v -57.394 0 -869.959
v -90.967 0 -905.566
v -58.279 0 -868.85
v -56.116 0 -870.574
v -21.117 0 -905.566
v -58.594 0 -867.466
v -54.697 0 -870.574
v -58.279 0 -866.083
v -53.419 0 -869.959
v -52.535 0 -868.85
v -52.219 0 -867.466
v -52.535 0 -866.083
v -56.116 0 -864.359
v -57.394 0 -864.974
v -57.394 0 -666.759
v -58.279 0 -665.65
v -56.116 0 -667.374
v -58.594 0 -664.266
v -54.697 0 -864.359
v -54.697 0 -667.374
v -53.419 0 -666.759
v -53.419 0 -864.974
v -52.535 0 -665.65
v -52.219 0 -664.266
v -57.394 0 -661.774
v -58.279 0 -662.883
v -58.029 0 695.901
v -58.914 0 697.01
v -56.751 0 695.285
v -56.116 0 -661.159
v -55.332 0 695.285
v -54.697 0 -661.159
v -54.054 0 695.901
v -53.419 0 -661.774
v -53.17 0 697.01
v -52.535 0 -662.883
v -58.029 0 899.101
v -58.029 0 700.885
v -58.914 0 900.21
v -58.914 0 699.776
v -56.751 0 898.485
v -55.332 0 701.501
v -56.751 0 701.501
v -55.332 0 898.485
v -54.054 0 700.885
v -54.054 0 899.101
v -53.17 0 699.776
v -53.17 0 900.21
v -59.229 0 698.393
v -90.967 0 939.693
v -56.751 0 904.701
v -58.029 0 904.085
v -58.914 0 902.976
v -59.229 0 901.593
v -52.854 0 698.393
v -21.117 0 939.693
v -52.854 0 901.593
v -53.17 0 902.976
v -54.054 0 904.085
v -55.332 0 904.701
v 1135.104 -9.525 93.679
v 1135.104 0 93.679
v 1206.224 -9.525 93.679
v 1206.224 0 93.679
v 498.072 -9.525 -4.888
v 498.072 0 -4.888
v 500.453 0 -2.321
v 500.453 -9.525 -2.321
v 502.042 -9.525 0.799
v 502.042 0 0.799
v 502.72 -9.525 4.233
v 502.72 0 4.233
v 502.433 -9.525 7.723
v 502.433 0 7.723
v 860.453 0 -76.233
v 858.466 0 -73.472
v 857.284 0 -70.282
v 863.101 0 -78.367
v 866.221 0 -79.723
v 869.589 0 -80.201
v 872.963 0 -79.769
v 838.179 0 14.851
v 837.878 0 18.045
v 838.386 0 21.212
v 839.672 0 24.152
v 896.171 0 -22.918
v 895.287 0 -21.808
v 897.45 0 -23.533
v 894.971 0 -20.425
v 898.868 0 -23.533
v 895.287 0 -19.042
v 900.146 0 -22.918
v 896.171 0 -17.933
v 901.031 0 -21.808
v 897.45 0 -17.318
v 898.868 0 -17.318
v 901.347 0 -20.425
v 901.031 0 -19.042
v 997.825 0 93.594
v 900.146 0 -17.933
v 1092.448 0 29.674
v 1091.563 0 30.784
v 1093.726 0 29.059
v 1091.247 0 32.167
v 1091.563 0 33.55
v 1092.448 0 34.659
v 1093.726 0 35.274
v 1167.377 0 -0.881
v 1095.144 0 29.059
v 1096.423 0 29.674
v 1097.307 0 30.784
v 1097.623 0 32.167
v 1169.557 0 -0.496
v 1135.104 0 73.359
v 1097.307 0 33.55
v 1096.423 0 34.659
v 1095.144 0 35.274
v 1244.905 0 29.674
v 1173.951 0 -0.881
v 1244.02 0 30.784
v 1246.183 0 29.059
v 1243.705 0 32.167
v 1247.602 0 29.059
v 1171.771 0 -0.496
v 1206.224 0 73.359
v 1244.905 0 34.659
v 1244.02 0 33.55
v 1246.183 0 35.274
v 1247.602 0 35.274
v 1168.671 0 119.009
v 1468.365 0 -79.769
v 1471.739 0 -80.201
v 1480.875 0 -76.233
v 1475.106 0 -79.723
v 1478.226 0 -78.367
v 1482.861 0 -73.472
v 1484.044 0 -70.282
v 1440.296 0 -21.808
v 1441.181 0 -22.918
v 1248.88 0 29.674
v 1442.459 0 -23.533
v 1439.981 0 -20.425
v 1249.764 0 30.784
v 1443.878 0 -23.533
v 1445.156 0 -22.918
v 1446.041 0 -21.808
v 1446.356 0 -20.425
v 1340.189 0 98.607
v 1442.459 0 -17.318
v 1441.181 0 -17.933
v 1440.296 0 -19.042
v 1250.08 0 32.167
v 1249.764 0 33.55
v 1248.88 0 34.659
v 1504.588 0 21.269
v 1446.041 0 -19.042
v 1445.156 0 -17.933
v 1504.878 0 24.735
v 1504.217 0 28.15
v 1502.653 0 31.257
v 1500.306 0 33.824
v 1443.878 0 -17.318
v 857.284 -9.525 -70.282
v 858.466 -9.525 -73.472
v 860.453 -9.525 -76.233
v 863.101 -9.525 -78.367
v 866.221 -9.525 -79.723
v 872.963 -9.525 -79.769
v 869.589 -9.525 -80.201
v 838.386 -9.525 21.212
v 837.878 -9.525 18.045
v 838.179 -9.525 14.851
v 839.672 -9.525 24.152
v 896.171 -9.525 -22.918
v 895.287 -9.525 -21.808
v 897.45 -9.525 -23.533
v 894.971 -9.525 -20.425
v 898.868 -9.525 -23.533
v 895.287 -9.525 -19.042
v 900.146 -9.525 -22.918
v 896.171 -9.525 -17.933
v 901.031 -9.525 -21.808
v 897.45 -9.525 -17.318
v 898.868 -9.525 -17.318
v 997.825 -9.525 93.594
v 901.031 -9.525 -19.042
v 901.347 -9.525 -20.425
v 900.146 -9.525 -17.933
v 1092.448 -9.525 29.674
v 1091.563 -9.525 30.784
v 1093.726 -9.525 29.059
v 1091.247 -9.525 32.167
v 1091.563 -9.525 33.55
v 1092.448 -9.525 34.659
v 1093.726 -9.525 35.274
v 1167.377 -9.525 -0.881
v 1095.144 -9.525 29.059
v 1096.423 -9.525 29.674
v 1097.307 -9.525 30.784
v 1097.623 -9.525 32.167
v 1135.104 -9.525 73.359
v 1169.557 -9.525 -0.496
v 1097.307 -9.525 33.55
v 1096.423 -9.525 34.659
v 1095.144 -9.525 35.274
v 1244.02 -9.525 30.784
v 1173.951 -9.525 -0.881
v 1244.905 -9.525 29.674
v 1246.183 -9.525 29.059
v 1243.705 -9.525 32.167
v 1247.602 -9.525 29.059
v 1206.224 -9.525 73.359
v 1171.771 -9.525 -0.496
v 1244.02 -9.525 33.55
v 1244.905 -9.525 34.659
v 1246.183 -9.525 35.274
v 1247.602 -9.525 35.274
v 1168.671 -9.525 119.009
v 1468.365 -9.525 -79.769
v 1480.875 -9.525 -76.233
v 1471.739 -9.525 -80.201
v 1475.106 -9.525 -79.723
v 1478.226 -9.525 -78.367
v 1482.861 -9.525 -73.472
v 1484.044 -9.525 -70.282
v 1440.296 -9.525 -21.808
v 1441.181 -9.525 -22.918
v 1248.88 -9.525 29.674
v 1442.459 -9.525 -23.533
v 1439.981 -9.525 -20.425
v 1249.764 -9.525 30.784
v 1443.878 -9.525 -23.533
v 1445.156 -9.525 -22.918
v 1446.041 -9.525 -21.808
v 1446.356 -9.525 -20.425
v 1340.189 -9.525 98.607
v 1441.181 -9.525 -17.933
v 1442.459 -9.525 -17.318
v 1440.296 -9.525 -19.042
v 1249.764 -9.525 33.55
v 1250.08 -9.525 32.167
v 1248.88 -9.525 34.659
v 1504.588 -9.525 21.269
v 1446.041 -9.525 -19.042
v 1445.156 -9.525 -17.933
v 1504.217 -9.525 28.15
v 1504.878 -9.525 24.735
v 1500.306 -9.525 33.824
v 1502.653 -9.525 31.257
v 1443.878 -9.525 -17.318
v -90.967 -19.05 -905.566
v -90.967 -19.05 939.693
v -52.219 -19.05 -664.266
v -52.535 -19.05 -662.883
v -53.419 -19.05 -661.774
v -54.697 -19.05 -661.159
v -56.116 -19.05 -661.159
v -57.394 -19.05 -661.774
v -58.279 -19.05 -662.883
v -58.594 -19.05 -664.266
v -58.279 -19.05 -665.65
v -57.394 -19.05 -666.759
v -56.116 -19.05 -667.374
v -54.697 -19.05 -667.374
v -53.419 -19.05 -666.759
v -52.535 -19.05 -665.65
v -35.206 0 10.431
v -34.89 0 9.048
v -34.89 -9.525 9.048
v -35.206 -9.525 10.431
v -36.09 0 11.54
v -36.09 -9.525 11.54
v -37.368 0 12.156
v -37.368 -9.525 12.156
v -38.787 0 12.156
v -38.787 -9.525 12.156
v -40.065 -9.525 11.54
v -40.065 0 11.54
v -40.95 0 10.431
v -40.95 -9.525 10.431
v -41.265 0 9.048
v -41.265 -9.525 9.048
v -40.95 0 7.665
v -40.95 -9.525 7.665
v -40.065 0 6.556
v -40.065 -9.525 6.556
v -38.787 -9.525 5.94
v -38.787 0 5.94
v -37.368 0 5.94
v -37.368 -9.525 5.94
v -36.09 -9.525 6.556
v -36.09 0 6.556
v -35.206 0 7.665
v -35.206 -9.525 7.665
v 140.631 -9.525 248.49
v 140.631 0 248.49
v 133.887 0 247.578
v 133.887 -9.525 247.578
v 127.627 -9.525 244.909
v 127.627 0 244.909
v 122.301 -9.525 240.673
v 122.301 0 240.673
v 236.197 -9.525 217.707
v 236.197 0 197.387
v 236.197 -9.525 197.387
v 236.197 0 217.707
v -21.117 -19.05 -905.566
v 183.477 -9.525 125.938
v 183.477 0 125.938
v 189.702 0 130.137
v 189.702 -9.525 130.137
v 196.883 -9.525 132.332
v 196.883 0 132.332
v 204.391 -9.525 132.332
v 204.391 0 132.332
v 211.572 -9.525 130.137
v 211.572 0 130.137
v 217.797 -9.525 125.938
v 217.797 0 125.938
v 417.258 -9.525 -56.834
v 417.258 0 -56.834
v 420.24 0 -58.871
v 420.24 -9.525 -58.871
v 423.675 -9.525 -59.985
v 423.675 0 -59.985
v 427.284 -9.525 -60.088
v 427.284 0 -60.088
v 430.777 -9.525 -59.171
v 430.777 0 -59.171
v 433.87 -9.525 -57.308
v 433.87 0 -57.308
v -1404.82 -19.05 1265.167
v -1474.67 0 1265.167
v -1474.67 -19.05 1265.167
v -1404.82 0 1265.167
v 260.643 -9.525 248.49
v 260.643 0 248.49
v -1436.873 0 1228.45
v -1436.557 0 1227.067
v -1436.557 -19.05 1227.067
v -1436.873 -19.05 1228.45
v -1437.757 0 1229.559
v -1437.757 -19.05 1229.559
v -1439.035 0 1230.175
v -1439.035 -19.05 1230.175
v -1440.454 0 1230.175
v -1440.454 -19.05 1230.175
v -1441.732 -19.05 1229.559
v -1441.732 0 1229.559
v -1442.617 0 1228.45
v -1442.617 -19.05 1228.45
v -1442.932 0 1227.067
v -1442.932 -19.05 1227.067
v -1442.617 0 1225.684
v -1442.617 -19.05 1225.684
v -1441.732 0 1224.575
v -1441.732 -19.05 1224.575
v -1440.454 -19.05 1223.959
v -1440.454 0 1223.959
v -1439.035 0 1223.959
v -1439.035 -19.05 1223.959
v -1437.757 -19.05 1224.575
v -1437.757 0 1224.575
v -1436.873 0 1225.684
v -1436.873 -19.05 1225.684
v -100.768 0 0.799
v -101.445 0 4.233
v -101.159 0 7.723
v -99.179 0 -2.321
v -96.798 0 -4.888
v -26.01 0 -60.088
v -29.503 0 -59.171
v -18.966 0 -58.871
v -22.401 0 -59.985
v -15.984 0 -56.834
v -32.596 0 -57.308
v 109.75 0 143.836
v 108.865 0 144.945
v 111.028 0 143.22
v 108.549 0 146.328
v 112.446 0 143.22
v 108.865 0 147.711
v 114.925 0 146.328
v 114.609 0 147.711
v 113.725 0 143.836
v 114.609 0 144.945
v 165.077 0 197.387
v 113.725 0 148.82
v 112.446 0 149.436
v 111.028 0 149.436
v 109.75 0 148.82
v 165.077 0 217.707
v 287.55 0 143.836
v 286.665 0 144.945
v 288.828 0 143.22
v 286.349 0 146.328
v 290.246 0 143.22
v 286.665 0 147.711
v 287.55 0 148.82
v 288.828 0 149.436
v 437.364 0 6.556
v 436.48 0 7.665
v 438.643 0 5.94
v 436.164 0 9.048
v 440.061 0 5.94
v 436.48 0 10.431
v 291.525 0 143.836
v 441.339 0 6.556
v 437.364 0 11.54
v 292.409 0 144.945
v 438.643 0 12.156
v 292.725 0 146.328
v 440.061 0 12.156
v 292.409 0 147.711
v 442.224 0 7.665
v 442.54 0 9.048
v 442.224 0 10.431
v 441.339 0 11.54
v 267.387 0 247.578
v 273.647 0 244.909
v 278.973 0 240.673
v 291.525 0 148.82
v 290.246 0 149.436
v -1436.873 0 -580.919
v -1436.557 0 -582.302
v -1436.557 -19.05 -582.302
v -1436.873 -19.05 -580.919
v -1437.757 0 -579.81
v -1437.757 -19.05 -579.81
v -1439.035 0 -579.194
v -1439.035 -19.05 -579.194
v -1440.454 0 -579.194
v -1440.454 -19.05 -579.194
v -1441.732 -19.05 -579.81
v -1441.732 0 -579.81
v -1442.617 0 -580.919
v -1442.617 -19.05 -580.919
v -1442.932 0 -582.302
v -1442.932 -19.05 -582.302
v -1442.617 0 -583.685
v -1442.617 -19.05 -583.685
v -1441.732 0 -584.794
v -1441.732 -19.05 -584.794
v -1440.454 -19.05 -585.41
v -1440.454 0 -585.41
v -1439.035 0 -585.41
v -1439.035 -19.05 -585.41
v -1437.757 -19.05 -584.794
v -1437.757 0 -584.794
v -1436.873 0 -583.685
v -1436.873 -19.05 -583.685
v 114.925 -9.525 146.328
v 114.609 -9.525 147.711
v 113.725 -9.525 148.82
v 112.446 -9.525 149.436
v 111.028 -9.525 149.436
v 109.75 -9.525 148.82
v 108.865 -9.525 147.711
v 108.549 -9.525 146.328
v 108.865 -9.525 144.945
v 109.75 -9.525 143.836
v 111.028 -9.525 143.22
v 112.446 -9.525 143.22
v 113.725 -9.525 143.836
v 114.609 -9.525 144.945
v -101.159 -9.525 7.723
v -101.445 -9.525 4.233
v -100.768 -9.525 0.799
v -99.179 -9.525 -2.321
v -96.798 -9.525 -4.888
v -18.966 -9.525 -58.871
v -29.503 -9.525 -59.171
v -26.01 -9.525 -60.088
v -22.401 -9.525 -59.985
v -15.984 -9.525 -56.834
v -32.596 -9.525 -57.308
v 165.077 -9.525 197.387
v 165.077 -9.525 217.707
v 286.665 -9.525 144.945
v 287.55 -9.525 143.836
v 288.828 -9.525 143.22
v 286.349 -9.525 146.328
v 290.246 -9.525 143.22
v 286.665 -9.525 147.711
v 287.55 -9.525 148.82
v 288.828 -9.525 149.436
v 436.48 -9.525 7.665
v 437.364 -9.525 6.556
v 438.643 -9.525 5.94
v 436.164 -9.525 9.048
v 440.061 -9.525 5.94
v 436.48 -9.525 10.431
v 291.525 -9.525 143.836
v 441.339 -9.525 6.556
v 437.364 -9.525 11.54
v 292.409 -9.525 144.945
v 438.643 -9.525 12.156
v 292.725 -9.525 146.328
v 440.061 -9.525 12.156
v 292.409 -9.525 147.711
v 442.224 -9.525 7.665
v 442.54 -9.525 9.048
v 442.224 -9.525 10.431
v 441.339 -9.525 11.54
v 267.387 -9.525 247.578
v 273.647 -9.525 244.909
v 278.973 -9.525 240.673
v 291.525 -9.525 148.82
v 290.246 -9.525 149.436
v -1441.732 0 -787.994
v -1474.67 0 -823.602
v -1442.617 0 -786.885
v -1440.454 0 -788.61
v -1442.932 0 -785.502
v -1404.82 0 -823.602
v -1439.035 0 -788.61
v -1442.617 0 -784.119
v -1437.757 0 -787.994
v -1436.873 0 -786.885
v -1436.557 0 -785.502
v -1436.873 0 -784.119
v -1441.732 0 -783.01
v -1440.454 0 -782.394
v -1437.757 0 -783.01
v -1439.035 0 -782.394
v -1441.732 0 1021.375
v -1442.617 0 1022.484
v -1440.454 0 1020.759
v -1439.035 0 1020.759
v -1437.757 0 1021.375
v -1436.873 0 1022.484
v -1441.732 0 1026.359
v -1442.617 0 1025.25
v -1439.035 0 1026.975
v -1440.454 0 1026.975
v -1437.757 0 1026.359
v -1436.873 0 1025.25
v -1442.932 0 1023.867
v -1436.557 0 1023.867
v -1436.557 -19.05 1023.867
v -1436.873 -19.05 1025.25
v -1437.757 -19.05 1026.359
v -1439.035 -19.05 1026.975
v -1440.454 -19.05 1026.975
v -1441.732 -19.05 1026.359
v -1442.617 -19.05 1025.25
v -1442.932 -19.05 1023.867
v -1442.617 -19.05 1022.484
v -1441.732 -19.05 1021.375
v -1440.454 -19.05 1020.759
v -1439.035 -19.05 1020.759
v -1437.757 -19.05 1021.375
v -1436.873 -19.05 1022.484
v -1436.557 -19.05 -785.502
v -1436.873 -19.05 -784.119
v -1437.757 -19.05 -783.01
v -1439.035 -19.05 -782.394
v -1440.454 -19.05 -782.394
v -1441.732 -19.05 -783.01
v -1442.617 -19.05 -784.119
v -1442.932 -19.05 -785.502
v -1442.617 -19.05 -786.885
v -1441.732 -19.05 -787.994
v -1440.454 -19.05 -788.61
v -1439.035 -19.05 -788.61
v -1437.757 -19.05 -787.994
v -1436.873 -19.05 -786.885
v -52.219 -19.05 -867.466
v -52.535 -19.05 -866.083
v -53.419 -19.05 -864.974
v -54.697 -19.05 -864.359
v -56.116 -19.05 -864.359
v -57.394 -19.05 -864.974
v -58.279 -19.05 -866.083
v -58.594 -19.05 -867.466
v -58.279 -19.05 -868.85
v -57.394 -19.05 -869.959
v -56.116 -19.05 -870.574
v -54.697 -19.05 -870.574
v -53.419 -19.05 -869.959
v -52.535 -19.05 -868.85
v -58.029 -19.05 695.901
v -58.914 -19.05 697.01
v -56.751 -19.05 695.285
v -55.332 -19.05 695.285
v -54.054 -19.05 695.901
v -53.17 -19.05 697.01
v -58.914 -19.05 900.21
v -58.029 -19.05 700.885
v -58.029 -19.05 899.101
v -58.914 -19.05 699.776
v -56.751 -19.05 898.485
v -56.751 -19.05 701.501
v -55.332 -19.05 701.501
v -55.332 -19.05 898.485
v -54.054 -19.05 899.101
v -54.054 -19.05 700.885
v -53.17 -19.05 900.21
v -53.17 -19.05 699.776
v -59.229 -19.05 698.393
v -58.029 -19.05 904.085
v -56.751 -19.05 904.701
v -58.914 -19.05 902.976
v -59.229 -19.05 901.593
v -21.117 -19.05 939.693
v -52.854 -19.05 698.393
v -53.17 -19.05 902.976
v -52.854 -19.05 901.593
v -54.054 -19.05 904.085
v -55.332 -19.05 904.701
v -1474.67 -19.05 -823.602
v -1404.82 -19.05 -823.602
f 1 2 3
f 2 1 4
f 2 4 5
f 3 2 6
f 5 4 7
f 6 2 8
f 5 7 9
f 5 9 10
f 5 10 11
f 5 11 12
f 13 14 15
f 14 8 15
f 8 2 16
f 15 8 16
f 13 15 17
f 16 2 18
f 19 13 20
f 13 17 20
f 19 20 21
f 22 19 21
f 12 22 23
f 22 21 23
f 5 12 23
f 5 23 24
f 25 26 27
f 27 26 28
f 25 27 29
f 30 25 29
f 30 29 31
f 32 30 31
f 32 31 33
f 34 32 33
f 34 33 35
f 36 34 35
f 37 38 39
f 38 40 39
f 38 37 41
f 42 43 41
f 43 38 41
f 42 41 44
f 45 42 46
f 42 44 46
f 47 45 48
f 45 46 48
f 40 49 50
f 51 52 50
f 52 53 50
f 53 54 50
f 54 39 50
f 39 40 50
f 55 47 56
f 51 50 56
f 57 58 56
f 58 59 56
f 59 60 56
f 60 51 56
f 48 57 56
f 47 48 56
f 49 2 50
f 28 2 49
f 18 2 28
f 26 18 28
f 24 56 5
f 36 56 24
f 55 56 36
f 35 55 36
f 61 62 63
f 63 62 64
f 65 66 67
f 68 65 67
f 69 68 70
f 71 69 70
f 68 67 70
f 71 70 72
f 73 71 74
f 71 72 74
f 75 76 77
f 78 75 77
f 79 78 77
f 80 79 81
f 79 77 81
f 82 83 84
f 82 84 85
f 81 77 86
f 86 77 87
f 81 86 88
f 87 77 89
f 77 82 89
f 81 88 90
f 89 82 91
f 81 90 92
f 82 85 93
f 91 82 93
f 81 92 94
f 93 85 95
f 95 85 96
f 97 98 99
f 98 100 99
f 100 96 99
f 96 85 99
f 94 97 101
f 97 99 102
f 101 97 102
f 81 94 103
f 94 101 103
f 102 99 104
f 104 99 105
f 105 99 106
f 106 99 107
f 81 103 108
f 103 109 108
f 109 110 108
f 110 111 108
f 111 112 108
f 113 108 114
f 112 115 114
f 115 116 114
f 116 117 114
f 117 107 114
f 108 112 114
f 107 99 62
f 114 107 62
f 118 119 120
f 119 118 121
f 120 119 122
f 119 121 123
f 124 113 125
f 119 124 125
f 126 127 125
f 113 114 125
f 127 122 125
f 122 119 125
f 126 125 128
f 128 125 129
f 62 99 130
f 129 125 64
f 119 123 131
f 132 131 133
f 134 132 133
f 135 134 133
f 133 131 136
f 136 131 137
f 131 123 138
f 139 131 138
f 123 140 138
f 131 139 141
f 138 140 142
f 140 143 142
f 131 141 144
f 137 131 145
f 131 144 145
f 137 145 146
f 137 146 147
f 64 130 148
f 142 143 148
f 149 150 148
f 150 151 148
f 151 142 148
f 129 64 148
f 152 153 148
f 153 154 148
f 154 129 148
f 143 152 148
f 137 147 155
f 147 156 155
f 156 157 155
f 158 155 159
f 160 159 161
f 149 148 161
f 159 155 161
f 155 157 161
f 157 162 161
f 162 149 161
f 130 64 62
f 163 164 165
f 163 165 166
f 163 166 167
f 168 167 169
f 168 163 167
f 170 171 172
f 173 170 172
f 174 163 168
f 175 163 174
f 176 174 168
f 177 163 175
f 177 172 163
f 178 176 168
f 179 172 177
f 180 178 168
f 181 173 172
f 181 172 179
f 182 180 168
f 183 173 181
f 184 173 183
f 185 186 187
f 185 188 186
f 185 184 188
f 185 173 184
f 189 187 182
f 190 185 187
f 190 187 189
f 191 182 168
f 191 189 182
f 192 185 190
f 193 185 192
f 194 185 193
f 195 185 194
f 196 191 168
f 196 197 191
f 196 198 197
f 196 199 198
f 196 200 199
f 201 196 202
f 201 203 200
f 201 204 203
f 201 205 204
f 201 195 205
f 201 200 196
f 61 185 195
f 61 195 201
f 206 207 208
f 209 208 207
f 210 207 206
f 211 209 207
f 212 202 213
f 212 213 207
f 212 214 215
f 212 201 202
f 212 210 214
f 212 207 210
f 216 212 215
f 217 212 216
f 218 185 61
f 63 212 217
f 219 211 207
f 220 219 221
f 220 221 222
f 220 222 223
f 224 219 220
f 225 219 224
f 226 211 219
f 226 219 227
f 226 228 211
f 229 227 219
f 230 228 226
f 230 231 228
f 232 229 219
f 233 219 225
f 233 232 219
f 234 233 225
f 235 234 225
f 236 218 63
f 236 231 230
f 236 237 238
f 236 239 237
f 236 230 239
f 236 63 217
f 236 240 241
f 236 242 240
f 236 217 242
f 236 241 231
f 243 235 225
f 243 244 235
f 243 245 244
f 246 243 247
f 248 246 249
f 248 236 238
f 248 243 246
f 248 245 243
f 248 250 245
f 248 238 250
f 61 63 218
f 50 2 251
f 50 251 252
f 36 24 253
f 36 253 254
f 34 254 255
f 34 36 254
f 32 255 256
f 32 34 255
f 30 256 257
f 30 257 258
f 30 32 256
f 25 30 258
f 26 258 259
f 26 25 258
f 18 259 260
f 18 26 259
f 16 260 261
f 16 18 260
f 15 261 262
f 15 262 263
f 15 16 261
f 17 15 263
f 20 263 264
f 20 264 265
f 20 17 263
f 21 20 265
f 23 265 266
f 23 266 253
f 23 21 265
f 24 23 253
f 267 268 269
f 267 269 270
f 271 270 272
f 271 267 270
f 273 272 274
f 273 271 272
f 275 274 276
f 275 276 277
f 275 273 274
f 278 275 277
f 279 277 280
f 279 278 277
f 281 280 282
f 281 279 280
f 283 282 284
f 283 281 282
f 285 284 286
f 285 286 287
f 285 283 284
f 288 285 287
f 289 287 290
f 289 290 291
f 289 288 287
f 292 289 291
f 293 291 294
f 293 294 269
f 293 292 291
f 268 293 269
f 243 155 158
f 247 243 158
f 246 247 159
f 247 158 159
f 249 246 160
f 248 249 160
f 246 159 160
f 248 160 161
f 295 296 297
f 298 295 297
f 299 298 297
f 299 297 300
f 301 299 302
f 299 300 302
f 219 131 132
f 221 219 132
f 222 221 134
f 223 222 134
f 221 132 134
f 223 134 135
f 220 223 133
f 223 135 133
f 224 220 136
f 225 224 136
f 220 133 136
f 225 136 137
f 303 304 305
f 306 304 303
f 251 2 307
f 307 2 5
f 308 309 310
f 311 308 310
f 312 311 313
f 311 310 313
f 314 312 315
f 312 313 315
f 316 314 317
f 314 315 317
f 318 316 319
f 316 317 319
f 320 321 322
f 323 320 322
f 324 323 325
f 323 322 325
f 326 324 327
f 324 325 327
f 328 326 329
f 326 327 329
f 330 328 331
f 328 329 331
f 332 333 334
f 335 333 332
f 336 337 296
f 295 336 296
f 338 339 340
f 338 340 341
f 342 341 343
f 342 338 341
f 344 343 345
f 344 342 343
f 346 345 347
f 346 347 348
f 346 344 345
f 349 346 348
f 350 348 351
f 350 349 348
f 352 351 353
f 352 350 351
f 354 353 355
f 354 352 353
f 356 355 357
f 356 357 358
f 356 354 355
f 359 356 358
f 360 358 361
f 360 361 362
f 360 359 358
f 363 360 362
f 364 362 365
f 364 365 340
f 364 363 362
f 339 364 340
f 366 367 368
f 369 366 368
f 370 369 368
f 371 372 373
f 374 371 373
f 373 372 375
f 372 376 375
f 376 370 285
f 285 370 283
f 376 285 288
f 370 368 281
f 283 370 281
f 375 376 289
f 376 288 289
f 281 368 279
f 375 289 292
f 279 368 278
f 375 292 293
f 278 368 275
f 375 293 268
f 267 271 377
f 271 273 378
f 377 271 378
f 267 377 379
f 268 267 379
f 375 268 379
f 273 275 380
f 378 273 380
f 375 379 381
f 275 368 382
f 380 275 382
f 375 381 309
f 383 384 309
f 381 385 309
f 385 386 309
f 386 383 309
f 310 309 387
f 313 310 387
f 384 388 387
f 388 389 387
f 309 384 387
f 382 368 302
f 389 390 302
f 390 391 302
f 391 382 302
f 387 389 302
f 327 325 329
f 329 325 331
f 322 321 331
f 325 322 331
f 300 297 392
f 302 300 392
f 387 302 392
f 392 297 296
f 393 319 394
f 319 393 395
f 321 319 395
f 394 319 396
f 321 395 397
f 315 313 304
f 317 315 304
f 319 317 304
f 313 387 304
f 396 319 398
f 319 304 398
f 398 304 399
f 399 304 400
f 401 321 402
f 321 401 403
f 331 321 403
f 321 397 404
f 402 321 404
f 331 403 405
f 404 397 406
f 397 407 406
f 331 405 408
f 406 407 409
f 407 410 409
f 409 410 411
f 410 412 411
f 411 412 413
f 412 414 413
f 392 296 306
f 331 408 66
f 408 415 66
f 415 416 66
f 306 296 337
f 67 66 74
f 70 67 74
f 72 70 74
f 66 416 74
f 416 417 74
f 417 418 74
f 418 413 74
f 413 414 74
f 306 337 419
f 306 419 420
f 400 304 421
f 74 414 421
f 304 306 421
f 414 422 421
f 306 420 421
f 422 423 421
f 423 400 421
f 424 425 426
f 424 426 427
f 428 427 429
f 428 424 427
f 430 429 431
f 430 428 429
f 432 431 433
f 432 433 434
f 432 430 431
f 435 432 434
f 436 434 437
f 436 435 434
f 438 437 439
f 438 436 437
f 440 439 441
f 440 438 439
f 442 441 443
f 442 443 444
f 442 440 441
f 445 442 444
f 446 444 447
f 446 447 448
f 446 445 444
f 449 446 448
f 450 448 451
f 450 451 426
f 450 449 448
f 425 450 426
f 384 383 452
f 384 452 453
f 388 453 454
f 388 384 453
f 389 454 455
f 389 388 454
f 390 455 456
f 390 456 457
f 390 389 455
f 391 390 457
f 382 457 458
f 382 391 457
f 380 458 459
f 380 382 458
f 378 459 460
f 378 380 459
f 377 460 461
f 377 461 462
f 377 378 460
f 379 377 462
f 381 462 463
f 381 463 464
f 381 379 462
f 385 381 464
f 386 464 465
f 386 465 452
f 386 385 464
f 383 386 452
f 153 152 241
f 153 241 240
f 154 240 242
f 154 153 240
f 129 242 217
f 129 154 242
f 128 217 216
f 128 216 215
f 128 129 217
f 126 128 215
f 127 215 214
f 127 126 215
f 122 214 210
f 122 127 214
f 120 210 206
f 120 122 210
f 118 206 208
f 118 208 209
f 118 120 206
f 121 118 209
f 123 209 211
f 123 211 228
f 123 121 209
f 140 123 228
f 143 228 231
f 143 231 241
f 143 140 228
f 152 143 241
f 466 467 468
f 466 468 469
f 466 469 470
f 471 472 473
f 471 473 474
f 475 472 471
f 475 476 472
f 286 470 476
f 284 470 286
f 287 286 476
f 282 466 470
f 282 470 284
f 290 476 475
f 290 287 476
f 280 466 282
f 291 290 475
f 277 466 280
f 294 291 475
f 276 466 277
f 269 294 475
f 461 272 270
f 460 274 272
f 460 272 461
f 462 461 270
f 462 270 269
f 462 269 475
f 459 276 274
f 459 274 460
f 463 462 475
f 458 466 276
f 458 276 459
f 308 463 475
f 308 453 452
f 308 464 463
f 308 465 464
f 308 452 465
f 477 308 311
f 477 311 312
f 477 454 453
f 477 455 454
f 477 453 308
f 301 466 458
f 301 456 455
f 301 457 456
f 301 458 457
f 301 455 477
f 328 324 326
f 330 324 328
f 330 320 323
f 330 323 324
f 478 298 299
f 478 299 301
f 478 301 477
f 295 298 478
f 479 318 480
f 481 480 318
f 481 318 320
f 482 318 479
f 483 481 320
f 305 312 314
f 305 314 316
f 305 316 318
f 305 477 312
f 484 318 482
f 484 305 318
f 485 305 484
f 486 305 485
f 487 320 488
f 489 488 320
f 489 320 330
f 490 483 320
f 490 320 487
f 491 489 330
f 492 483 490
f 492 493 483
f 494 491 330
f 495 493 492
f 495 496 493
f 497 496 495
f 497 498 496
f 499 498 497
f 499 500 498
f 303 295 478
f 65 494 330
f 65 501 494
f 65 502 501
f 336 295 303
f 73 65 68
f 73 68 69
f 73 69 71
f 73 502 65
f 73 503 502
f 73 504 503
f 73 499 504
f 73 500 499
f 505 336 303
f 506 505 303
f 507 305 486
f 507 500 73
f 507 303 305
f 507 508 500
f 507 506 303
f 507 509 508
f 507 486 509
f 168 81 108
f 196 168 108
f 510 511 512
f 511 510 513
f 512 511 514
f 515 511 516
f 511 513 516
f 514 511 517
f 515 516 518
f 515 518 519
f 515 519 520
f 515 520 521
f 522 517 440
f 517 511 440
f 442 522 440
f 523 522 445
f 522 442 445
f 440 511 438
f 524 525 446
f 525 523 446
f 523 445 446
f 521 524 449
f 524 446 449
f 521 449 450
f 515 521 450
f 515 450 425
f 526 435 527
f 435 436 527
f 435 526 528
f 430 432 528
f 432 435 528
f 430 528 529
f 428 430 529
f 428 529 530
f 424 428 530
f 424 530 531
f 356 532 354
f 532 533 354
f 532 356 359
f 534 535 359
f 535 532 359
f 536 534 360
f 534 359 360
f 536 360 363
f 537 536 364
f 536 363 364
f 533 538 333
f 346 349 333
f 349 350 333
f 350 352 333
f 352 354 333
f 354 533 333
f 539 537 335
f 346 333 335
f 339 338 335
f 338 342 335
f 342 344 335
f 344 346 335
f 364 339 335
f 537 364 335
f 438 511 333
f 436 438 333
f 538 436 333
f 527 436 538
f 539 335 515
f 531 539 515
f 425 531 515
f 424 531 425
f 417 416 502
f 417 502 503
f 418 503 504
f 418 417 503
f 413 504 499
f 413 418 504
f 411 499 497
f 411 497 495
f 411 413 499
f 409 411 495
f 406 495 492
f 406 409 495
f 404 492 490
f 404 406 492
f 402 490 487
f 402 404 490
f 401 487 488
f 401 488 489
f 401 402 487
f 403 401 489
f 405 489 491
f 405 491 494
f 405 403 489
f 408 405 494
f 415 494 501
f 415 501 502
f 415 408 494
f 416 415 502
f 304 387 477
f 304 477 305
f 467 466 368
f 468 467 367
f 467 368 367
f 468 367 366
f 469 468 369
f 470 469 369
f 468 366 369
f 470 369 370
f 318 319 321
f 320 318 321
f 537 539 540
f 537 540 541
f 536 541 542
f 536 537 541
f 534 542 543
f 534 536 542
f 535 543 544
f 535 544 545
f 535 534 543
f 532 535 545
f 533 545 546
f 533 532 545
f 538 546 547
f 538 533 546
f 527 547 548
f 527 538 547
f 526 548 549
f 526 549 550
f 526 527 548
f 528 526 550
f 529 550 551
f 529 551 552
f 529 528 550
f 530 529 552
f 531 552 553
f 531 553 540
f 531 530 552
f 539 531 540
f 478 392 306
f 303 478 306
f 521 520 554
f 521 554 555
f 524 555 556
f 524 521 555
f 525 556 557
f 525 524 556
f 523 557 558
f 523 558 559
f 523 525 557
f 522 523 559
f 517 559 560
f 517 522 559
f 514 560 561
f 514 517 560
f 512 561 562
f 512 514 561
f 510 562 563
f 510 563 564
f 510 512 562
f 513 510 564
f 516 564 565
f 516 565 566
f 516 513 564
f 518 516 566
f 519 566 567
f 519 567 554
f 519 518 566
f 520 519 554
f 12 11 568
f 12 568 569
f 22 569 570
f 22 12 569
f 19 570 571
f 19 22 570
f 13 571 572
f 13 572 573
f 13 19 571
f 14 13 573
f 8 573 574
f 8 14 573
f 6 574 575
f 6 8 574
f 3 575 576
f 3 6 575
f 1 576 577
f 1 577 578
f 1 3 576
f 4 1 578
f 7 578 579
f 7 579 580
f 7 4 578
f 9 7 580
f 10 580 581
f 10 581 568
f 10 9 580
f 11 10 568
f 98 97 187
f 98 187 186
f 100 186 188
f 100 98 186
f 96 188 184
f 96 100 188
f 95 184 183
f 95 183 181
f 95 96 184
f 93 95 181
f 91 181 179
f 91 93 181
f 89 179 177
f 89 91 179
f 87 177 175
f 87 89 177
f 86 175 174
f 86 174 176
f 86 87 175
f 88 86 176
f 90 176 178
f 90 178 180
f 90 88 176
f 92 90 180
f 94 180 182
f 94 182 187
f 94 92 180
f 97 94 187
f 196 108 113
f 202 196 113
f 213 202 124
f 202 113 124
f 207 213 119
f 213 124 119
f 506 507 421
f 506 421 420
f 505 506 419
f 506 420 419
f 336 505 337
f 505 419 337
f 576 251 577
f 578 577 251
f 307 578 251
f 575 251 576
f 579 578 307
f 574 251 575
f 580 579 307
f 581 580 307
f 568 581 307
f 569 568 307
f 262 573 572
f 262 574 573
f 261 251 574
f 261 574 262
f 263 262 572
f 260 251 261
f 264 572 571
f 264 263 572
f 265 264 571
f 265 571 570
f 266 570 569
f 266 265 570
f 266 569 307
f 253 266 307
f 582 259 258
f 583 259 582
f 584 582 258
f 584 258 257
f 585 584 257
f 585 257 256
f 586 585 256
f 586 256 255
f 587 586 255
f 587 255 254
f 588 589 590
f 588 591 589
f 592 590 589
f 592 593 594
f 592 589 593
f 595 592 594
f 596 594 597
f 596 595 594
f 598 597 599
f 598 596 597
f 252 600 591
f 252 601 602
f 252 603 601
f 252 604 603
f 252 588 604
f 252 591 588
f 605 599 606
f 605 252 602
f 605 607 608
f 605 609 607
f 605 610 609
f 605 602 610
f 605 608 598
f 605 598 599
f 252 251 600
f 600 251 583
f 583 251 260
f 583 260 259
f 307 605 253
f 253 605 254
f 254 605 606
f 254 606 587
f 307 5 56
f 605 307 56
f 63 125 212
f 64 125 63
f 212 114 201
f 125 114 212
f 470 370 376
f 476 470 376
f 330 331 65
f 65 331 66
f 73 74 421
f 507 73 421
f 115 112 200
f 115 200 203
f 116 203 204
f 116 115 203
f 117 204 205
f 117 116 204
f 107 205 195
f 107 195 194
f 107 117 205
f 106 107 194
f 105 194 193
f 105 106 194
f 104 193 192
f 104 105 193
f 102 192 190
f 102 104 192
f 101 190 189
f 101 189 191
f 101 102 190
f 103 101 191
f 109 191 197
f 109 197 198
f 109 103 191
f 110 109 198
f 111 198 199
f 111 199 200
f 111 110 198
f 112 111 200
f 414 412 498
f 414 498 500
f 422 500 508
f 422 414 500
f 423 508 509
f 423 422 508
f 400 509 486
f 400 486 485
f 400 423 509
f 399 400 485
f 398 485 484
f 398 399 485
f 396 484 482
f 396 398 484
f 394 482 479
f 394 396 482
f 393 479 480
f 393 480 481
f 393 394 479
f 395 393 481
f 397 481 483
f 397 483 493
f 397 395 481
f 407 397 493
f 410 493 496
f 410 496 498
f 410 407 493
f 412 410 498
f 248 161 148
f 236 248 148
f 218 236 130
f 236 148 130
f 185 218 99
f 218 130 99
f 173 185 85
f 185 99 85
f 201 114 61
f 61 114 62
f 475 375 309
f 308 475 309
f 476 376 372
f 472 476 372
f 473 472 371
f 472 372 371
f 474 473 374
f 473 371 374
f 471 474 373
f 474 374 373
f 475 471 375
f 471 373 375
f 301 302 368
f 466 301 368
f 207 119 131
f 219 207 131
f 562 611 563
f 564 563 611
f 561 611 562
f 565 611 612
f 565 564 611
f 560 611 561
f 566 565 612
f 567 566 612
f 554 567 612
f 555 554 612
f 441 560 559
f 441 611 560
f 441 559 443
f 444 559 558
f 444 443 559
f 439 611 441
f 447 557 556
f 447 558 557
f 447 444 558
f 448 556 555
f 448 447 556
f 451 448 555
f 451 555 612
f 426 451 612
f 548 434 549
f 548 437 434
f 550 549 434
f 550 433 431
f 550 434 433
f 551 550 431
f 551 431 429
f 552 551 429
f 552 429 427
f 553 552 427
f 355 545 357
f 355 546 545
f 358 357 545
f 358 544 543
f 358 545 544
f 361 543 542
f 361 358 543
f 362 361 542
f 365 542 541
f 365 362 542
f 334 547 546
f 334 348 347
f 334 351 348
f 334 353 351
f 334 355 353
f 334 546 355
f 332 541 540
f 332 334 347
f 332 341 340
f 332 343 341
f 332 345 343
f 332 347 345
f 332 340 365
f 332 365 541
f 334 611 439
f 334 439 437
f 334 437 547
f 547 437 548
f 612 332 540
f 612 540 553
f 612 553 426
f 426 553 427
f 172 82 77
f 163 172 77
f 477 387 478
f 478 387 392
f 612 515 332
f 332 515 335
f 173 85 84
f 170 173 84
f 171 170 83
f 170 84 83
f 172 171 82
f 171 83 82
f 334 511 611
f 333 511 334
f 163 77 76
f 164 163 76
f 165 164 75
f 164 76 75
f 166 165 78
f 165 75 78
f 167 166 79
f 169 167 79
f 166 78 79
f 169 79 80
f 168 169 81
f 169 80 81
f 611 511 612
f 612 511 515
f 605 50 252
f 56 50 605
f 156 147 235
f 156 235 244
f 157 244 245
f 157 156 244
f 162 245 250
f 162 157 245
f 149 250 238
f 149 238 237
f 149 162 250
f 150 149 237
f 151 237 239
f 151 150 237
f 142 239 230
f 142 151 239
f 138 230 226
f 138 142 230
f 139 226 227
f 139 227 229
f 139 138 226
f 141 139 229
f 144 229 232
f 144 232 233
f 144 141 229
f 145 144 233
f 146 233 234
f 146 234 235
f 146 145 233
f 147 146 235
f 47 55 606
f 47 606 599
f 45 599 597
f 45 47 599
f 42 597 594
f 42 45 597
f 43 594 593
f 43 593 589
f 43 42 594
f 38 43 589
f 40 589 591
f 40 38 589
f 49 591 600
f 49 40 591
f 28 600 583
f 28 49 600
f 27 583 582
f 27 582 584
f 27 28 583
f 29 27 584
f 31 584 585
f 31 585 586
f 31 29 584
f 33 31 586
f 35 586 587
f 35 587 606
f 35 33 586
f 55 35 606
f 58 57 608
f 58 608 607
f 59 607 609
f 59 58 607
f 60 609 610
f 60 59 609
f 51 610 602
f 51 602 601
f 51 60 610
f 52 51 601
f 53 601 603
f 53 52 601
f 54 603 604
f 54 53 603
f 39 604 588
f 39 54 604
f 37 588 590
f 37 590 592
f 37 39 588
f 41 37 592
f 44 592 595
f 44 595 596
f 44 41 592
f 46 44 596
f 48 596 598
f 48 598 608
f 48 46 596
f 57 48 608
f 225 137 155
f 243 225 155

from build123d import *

# Parameters (mm, degrees)
F0_R     = 3.1877
F0_W     = 71.12
F0_H     = 20.32
F1_DEPTH = 9.525
F2_R     = 3.1877
F2_W     = 71.12
F2_H     = 20.32
F3_DEPTH = 9.525
F0_W_2   = 69.85
F0_H_2   = 2088.769
F4_DEPTH = 19.05
F0_H_3   = 1845.2592


# Not quite as in the source:
# - a length typed as a fraction of an inch, garbled in the dataset ("3 / 203.2 mm" for 3/8 in), is restored


with BuildPart() as f1:
    # F0 (on Front) → F1 (new body)
    with BuildSketch(Plane.XZ):
        with BuildLine():
            ThreePointArc((839.6723722923, 24.1515339259), (838.0317131921, 19.644837613), (838.1793448674, 14.8510626048))
            Line((838.1793448674, 14.8510626048), (857.2836977415, -70.2823224184))
            ThreePointArc((857.2836977415, -70.2823224184), (863.1011199006, -78.3674132665), (872.9625206832, -79.7687944446))
            Line((872.9625206832, -79.7687944446), (1167.3767125361, -0.8807494973))
            ThreePointArc((1167.3767125361, -0.8807494973), (1170.6637144089, -0.4480074912), (1173.9507162817, -0.8807494973))
            Line((1173.9507162817, -0.8807494973), (1468.3649081346, -79.7687944446))
            ThreePointArc((1468.3649081346, -79.7687944446), (1478.2263089171, -78.3674132665), (1484.0437310762, -70.2823224184))
            Line((1484.0437310762, -70.2823224184), (1504.5883732454, 21.2693225641))
            ThreePointArc((1504.5883732454, 21.2693225641), (1504.2165188216, 28.1501575378), (1500.3059571794, 33.8239281792))
            ThreePointArc((1500.3059571794, 33.8239281792), (1168.6711535979, 119.0091259816), (839.6723722923, 24.1515339259))
        make_face()
        with Locations((898.1589318866, -20.4254064456)):
            Circle(F0_R, mode=Mode.SUBTRACT)
        with Locations((1094.4350597885, 32.1666235192)):
            Circle(F0_R, mode=Mode.SUBTRACT)
        with Locations((1246.8923690293, 32.1666235192)):
            Circle(F0_R, mode=Mode.SUBTRACT)
        with Locations((1443.1684969312, -20.4254064456)):
            Circle(F0_R, mode=Mode.SUBTRACT)
        with Locations((1170.6637144089, 83.5188999772)):
            Rectangle(F0_W, F0_H, mode=Mode.SUBTRACT)
    extrude(amount=F1_DEPTH)


with BuildPart() as f3:
    # F2 (on Front) → F3 (new body)
    with BuildSketch(Plane.XZ):
        with BuildLine():
            ThreePointArc((-101.1592128677, 7.7226741622), (-100.7680553509, 0.798604341), (-96.7978449984, -4.8876226022))
            Line((-96.7978449984, -4.8876226022), (-32.5961750252, -57.3083489018))
            ThreePointArc((-32.5961750252, -57.3083489018), (-24.2017892971, -60.1658271529), (-15.9839681804, -56.8344145691))
            Line((-15.9839681804, -56.8344145691), (183.4770895885, 125.9379706671))
            ThreePointArc((183.4770895885, 125.9379706671), (200.6370808619, 132.6111263121), (217.7970721354, 125.9379706671))
            Line((217.7970721354, 125.9379706671), (417.2581299043, -56.8344145691))
            ThreePointArc((417.2581299043, -56.8344145691), (425.4759510209, -60.1658271529), (433.8703367491, -57.3083489018))
            Line((433.8703367491, -57.3083489018), (498.0720067222, -4.8876226022))
            ThreePointArc((498.0720067222, -4.8876226022), (502.0422170747, 0.798604341), (502.4333745915, 7.7226741622))
            Line((502.4333745915, 7.7226741622), (278.9733440379, 240.6731787355))
            ThreePointArc((278.9733440379, 240.6731787355), (270.6069010187, 246.4541627355), (260.6433282158, 248.4899333025))
            Line((260.6433282158, 248.4899333025), (200.6370808619, 248.4899333025))
            Line((200.6370808619, 248.4899333025), (140.6308335081, 248.4899333025))
            ThreePointArc((140.6308335081, 248.4899333025), (130.6672607051, 246.4541627355), (122.3008176859, 240.6731787355))
            Line((122.3008176859, 240.6731787355), (-101.1592128677, 7.7226741622))
        make_face()
        with Locations((-38.0776739779, 9.0481323209)):
            Circle(F2_R, mode=Mode.SUBTRACT)
        with Locations((111.7370808619, 146.3280625084)):
            Circle(F2_R, mode=Mode.SUBTRACT)
        with Locations((439.3518357017, 9.0481323209)):
            Circle(F2_R, mode=Mode.SUBTRACT)
        with Locations((289.5370808619, 146.3280625084)):
            Circle(F2_R, mode=Mode.SUBTRACT)
        with Locations((200.637060461, 207.5467059735)):
            Rectangle(F2_W, F2_H, mode=Mode.SUBTRACT)
    extrude(amount=F3_DEPTH)


with BuildPart() as f4:
    # F0 (on Front) → F4 (new body)
    with BuildSketch(Plane.XZ):
        with Locations((-1439.7445756912, 220.7827176781)):
            Rectangle(F0_W_2, F0_H_2)
        with Locations((-1439.7445756912, -785.5017823219)):
            Circle(F0_R, mode=Mode.SUBTRACT)
        with Locations((-1439.7445756912, -582.3017823219)):
            Circle(F0_R, mode=Mode.SUBTRACT)
        with Locations((-1439.7445756912, 1023.8672176781)):
            Circle(F0_R, mode=Mode.SUBTRACT)
        with Locations((-1439.7445756912, 1227.0672176781)):
            Circle(F0_R, mode=Mode.SUBTRACT)
    extrude(amount=F4_DEPTH)


with BuildPart() as f4b:
    # F0 (on Front) → F4, piece 2 (new body)
    with BuildSketch(Plane.XZ):
        with Locations((-56.0417547822, 17.06318371)):
            Rectangle(F0_W_2, F0_H_3)
        with Locations((-55.4067566991, -867.46641629)):
            Circle(F0_R, mode=Mode.SUBTRACT)
        with Locations((-55.4067566991, -664.26641629)):
            Circle(F0_R, mode=Mode.SUBTRACT)
        with Locations((-56.0417547822, 698.39278371)):
            Circle(F0_R, mode=Mode.SUBTRACT)
        with Locations((-56.0417547822, 901.59278371)):
            Circle(F0_R, mode=Mode.SUBTRACT)
    extrude(amount=F4_DEPTH)


solid = Compound([f1.part, f3.part, f4.part, f4b.part])
